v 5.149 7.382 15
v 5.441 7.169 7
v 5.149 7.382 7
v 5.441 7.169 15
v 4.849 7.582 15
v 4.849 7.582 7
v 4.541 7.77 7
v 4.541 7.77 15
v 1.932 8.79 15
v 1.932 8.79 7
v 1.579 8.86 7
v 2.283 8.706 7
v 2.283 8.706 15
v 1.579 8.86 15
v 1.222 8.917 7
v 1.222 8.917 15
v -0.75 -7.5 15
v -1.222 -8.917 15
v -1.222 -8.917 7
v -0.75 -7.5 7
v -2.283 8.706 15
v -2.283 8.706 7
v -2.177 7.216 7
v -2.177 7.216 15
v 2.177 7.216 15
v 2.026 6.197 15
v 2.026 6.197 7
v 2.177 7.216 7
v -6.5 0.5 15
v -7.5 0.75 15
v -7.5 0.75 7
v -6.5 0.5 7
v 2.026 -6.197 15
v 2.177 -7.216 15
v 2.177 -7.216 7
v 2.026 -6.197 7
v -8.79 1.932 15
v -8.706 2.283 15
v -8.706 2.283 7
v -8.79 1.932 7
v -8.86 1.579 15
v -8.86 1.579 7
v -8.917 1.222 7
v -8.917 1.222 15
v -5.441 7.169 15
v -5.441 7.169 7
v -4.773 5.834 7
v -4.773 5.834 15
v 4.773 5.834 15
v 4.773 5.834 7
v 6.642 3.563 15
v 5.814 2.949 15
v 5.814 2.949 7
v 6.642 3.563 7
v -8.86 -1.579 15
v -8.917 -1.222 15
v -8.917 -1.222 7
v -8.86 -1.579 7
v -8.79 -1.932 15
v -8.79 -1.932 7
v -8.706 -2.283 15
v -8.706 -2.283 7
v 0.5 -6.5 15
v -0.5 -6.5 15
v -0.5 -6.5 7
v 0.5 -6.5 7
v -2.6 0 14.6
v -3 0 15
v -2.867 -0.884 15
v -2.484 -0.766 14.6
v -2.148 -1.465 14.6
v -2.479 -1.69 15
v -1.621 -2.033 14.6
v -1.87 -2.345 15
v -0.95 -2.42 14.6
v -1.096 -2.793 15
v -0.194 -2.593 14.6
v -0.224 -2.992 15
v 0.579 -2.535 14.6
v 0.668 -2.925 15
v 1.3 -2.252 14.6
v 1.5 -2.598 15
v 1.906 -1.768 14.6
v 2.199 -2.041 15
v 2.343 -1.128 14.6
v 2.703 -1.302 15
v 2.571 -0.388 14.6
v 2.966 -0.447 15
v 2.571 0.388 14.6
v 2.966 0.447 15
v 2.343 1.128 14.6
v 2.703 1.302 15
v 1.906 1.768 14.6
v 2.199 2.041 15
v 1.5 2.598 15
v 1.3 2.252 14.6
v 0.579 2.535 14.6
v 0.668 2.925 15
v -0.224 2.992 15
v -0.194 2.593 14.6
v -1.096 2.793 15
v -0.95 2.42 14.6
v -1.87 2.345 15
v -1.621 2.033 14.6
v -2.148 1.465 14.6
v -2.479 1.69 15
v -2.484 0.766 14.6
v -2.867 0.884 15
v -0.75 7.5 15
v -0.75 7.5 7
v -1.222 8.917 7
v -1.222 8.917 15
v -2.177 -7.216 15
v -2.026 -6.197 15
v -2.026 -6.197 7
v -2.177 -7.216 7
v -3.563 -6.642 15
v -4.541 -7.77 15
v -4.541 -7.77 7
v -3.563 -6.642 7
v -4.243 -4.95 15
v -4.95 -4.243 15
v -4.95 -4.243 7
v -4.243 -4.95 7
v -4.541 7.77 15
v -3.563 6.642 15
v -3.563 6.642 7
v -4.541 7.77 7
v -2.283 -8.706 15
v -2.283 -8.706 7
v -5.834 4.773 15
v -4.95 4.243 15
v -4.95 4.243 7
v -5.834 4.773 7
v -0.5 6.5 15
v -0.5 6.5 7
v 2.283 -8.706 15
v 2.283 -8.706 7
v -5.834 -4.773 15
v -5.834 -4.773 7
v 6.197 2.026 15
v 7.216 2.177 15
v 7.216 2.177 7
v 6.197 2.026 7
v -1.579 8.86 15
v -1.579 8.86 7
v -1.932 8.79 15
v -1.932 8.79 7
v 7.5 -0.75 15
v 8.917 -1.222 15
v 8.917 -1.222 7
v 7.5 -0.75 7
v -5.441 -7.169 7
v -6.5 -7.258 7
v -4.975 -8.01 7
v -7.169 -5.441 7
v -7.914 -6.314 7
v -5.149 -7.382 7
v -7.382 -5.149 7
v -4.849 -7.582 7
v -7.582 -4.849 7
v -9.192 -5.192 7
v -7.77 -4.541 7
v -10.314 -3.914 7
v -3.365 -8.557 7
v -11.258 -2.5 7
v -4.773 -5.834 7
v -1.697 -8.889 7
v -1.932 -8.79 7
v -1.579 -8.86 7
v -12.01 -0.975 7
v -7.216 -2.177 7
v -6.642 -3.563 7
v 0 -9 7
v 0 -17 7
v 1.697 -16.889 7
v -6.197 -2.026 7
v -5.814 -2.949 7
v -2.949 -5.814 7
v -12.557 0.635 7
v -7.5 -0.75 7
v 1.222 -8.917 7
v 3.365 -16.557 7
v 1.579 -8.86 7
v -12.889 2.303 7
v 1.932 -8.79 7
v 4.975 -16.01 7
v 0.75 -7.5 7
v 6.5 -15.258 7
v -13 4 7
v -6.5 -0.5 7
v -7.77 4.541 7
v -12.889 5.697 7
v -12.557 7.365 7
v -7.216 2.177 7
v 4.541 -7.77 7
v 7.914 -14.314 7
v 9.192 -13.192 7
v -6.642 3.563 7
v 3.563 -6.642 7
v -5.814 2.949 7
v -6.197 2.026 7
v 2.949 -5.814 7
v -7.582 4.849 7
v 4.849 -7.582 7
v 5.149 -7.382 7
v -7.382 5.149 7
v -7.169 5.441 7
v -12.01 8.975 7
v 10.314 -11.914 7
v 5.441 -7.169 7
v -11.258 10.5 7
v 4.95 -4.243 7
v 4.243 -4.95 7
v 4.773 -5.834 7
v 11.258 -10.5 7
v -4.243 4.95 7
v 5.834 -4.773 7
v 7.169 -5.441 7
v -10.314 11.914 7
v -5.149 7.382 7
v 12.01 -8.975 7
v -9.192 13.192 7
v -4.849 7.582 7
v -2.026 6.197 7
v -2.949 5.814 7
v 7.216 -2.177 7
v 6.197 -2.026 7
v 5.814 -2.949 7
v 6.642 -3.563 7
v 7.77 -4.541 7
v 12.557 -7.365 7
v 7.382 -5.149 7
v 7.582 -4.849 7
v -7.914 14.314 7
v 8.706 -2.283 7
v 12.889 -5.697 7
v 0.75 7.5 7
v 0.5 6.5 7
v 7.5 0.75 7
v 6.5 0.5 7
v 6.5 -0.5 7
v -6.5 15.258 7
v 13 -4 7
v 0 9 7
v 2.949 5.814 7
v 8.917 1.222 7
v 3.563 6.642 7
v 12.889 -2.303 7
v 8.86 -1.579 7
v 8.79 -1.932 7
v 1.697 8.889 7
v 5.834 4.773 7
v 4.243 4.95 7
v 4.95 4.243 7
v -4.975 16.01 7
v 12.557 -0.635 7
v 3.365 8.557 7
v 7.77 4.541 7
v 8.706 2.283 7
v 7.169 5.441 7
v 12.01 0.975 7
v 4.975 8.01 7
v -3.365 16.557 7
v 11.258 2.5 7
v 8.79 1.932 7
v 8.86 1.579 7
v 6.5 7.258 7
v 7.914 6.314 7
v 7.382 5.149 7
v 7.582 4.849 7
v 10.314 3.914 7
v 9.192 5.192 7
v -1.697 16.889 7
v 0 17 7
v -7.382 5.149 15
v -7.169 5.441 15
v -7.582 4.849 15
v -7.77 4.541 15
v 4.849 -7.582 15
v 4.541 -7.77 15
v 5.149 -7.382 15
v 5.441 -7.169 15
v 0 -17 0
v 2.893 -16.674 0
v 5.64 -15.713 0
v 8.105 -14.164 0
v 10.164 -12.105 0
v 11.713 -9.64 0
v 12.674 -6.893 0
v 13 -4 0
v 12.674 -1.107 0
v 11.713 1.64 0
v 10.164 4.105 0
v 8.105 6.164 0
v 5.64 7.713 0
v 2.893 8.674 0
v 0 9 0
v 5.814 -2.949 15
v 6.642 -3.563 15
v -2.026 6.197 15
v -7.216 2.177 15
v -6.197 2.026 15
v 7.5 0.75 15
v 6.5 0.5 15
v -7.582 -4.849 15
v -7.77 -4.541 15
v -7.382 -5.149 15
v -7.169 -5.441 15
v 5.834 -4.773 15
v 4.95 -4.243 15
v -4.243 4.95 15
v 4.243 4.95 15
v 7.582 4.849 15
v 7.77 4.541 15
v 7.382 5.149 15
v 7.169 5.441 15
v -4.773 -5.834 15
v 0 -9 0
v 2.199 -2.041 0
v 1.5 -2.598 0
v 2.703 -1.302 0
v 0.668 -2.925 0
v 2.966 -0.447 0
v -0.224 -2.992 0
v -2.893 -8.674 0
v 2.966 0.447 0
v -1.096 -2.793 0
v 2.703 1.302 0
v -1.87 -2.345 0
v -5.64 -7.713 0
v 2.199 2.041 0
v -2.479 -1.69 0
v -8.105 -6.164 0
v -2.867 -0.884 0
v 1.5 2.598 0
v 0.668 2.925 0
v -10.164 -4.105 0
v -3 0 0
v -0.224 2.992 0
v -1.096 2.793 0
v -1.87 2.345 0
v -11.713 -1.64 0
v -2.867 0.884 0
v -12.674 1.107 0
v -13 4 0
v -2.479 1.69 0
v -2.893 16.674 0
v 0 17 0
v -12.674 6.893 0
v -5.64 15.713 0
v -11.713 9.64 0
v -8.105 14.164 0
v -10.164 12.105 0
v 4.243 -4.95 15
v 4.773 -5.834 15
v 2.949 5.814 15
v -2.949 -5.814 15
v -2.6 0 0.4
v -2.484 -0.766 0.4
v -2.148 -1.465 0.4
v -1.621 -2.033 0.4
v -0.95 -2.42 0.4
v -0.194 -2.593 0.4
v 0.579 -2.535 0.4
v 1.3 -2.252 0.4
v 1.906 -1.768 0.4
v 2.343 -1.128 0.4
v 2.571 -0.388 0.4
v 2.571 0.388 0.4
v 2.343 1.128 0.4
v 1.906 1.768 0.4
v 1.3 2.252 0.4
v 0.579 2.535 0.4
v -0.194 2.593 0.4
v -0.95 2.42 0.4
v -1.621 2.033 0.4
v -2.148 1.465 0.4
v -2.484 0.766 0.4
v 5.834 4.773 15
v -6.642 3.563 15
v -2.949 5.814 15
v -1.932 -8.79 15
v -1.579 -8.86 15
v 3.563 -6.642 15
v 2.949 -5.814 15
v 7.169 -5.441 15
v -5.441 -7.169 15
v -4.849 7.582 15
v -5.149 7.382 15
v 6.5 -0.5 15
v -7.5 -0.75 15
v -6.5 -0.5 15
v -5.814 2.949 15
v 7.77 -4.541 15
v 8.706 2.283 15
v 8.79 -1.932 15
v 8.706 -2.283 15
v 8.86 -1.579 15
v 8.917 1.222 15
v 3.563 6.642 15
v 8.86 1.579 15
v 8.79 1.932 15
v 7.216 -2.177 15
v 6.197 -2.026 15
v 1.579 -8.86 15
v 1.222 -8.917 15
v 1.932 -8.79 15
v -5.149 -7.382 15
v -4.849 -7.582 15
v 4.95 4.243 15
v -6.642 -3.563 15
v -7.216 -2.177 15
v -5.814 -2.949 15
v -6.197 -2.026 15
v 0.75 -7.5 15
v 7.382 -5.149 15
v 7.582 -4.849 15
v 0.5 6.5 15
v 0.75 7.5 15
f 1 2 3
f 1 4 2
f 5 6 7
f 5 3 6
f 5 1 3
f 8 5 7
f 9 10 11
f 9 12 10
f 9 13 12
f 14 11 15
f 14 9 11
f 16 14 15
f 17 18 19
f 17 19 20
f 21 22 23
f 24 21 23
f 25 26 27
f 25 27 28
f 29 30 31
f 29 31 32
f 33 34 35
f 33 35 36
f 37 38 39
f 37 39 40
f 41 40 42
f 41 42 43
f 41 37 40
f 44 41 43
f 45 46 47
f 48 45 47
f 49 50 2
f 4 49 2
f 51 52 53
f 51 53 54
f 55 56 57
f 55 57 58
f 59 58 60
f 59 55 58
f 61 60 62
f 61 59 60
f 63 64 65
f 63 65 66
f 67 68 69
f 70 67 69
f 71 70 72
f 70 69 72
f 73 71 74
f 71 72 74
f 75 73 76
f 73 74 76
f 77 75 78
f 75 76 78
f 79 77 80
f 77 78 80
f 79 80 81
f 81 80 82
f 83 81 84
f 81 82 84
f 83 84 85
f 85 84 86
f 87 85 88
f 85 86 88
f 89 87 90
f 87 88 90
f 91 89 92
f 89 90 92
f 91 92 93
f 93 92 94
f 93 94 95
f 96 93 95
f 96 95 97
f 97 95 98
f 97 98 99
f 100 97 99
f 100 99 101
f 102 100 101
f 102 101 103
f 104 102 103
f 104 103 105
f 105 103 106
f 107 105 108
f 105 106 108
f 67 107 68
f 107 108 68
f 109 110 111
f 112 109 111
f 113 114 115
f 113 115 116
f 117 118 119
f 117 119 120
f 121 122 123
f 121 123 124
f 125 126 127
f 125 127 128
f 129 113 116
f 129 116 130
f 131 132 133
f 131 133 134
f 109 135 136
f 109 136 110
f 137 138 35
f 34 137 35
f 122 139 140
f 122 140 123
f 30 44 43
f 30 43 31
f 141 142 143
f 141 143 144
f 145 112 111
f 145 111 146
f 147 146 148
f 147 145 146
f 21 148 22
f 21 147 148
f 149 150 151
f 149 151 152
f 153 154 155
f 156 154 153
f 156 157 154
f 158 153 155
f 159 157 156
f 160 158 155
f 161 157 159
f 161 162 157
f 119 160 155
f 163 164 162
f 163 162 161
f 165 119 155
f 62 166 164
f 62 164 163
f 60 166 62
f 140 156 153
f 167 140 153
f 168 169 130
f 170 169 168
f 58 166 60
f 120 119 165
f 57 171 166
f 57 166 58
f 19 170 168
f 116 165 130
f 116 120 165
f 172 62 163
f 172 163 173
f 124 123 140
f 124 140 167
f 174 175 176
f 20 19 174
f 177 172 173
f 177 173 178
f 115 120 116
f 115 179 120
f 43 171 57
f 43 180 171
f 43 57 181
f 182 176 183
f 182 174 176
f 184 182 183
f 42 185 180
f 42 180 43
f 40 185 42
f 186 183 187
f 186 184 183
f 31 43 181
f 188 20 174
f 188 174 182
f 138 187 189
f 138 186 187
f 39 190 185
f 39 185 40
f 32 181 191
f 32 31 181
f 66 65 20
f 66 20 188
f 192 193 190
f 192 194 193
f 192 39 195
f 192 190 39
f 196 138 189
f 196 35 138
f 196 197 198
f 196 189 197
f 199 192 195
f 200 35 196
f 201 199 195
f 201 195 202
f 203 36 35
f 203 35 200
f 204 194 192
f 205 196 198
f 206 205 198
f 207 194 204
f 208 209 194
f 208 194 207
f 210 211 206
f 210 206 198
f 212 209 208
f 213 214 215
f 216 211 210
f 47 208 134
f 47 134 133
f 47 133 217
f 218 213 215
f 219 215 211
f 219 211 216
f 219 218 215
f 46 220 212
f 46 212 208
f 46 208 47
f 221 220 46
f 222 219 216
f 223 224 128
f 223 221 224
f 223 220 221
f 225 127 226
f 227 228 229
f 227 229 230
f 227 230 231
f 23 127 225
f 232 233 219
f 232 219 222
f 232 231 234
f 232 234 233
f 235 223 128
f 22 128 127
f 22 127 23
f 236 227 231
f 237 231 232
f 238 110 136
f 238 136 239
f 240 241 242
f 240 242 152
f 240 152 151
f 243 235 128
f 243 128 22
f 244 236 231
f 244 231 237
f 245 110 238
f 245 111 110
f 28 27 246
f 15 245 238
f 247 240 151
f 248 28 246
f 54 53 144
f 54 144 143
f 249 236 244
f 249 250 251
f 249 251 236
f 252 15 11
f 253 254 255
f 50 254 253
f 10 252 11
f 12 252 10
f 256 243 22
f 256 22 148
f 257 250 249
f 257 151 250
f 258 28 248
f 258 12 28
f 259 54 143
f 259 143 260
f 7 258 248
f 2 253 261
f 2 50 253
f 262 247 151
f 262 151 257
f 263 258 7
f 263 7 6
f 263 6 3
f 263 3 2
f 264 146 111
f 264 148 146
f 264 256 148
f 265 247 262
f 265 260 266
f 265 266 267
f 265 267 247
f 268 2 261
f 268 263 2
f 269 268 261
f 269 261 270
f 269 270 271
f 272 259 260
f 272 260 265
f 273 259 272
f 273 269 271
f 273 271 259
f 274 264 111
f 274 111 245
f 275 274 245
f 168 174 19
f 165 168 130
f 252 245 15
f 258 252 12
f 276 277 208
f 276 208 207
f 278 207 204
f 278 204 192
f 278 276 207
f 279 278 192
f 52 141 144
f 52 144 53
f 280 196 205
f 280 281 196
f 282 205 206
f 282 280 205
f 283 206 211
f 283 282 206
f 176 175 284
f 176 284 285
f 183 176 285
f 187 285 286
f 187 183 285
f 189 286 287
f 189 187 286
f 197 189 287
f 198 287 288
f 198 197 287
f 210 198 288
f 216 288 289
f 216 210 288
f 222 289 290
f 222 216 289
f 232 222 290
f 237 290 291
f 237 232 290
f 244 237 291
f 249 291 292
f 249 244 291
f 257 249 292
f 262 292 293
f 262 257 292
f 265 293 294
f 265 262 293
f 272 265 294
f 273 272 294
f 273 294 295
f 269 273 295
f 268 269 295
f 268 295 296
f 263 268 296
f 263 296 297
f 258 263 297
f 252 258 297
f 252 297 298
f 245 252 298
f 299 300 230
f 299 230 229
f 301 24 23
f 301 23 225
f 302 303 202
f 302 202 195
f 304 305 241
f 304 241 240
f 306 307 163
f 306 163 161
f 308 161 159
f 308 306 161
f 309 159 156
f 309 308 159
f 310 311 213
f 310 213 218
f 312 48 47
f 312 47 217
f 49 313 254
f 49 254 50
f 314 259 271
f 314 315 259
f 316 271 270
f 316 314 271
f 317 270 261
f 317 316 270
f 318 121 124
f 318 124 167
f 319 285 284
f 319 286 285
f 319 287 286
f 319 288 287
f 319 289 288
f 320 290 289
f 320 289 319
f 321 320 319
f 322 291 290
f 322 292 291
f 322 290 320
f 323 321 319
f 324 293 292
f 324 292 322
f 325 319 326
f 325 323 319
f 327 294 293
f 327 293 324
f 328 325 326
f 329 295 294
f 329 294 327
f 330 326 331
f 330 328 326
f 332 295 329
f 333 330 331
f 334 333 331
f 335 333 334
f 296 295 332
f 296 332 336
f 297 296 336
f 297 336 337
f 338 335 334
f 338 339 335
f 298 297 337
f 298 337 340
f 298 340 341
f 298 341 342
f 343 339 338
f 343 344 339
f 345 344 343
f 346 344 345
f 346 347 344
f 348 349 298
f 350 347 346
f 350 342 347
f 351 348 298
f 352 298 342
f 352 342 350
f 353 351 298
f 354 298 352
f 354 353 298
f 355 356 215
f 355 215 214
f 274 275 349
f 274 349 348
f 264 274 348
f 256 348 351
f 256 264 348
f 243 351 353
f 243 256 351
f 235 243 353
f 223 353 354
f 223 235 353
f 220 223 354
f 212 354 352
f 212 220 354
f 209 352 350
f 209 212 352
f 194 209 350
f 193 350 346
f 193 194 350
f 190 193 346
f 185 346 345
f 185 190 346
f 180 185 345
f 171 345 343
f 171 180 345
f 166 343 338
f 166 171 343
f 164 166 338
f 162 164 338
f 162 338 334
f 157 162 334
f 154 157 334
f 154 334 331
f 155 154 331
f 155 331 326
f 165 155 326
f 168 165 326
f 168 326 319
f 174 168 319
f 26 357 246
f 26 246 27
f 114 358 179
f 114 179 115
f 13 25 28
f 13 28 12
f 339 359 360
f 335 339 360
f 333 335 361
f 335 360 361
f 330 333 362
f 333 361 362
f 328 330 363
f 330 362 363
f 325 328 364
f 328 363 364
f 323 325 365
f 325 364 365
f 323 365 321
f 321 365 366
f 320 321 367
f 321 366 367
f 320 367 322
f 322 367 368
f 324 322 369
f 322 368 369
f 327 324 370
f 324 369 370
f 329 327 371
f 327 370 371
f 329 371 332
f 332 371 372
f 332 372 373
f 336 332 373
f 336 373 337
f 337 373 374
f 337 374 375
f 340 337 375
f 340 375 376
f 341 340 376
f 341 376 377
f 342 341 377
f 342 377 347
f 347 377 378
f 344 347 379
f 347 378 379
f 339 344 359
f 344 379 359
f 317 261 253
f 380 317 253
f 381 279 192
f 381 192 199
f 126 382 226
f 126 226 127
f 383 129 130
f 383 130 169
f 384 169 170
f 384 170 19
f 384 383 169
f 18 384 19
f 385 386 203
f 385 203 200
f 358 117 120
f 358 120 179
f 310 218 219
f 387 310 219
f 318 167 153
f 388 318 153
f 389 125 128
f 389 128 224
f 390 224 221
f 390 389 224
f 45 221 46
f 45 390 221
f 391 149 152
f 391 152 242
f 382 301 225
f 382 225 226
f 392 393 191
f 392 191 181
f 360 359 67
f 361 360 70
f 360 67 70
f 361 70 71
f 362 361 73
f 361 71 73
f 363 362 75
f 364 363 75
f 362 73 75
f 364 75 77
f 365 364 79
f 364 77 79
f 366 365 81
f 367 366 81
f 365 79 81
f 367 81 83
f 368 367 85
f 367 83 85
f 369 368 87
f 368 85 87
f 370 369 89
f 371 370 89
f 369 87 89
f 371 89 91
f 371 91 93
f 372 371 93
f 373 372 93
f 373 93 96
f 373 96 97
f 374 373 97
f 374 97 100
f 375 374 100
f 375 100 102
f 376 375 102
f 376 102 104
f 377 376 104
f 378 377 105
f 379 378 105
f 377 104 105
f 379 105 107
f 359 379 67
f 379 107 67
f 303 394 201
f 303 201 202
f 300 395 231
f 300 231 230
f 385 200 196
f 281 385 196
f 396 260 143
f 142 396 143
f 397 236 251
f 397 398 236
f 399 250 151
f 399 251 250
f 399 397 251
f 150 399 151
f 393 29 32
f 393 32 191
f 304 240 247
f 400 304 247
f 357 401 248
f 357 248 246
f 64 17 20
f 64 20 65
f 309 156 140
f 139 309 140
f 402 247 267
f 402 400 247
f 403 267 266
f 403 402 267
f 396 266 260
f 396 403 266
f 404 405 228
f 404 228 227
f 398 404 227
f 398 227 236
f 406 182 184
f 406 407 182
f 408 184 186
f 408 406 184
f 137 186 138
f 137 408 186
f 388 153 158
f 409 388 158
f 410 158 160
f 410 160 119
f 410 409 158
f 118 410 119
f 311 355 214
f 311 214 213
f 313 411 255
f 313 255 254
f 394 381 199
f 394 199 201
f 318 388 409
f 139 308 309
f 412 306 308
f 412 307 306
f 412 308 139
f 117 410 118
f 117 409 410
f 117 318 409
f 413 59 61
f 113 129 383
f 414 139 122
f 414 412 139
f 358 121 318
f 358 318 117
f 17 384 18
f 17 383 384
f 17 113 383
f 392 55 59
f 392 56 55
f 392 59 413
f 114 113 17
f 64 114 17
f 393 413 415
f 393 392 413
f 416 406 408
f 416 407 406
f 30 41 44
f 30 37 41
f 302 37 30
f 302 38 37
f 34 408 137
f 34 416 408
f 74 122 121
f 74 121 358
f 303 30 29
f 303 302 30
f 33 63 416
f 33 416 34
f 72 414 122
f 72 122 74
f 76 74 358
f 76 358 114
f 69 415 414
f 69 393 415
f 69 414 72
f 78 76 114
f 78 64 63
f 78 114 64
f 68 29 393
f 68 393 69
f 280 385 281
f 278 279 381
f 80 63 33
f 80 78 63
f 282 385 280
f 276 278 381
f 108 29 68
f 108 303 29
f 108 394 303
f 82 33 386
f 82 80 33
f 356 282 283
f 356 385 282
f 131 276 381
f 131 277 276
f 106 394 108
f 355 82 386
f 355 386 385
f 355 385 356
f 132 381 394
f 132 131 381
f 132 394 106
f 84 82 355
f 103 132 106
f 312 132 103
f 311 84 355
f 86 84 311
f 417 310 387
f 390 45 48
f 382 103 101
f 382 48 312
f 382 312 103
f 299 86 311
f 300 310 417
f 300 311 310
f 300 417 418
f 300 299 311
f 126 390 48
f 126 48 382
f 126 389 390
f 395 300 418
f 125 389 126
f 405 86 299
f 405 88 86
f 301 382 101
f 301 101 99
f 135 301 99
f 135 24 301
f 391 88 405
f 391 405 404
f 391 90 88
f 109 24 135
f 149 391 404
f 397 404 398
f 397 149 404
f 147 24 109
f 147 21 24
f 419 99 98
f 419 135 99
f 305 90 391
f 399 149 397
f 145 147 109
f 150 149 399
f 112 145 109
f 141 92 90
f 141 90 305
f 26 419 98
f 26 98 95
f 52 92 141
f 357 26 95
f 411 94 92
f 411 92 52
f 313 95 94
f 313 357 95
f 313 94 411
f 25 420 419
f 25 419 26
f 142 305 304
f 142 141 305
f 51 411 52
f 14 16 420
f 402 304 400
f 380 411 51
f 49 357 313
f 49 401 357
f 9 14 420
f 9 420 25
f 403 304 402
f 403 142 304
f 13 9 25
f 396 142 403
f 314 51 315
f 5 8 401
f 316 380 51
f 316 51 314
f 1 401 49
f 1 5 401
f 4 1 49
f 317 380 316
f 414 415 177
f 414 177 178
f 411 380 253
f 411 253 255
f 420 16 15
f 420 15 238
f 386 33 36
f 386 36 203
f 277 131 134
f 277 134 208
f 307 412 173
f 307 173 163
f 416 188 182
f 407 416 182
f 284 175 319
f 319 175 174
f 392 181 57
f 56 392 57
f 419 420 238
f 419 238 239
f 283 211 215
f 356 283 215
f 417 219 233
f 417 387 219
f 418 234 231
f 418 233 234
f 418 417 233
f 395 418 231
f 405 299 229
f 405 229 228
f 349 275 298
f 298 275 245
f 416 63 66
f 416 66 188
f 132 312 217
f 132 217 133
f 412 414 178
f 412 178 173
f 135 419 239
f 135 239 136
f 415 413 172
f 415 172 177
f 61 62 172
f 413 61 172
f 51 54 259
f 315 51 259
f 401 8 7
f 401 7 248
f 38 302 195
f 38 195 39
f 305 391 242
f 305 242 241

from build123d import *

# Parameters (mm, degrees)
POCKET_DEPTH          = 7
POLARPATTERN_COUNT    = 2
POCKET001_DEPTH       = 8
POLARPATTERN001_COUNT = 16
SKETCH003_R           = 2.6
POCKET002_DEPTH       = 15
CHAMFER_SIZE          = 0.4


with BuildPart() as part:
    # Sketch → Revolution (revolve)
    with BuildSketch(Plane.XZ):
        Polygon((0, 0), (17, 0), (17, 7), (9, 7), (9, 15), (0, 15), align=None)
    revolve(axis=Axis((0, 0, 0), (0, 0, 1)))

    # Sketch001 (on Face3 of Revolution) → Pocket (cut)
    with BuildSketch(Plane(origin=(0, 0, 7), x_dir=(-1, 0, 0), z_dir=(0, 0, 1))):
        with BuildLine():
            Line((0, 17), (17, 17))
            Line((17, 17), (17, -17))
            Line((17, -17), (0, -17))
            ThreePointArc((0, -17), (13, -4), (0, 9))
            Line((0, 17), (0, 9))
        make_face()
    pocket = extrude(amount=-POCKET_DEPTH, mode=Mode.SUBTRACT)

    # PolarPattern: Pocket ×2 about axis
    polarpattern_axis = Axis((0, 0, 7), (0, 0, 1))
    for i in range(1, POLARPATTERN_COUNT):
        add(pocket.rotate(polarpattern_axis, i * 360 / POLARPATTERN_COUNT), mode=Mode.SUBTRACT)

    # Sketch002 (on Face5 of Revolution) → Pocket001 (cut)
    with BuildSketch(Plane(origin=(0, 0, 15), x_dir=(-1, 0, 0), z_dir=(0, 0, 1))):
        Polygon((-1.25, 9), (1.25, 9), (0.75, 7.5), (0.5, 6.5), (-0.5, 6.5), (-0.75, 7.5), align=None)
    pocket001 = extrude(amount=-POCKET001_DEPTH, mode=Mode.SUBTRACT)

    # PolarPattern001: Pocket001 ×16 about axis
    polarpattern001_axis = Axis((0, 0, 15), (0, 0, 1))
    for i in range(1, POLARPATTERN001_COUNT):
        add(pocket001.rotate(polarpattern001_axis, i * 360 / POLARPATTERN001_COUNT), mode=Mode.SUBTRACT)

    # Sketch003 (on Face5 of Revolution) → Pocket002 (cut)
    with BuildSketch(Plane(origin=(0, 0, 15), x_dir=(-1, 0, 0), z_dir=(0, 0, 1))):
        Circle(SKETCH003_R)
    extrude(amount=-POCKET002_DEPTH, mode=Mode.SUBTRACT)

    # Chamfer
    chamfer_edges = [part.edges().sort_by_distance(p)[0] for p in [
        (-2.6, 0, 7.5),
        (2.6, 0, 15),
        (2.6, 0, 0),
    ]]
    chamfer(chamfer_edges, length=CHAMFER_SIZE)


solid = part.part
